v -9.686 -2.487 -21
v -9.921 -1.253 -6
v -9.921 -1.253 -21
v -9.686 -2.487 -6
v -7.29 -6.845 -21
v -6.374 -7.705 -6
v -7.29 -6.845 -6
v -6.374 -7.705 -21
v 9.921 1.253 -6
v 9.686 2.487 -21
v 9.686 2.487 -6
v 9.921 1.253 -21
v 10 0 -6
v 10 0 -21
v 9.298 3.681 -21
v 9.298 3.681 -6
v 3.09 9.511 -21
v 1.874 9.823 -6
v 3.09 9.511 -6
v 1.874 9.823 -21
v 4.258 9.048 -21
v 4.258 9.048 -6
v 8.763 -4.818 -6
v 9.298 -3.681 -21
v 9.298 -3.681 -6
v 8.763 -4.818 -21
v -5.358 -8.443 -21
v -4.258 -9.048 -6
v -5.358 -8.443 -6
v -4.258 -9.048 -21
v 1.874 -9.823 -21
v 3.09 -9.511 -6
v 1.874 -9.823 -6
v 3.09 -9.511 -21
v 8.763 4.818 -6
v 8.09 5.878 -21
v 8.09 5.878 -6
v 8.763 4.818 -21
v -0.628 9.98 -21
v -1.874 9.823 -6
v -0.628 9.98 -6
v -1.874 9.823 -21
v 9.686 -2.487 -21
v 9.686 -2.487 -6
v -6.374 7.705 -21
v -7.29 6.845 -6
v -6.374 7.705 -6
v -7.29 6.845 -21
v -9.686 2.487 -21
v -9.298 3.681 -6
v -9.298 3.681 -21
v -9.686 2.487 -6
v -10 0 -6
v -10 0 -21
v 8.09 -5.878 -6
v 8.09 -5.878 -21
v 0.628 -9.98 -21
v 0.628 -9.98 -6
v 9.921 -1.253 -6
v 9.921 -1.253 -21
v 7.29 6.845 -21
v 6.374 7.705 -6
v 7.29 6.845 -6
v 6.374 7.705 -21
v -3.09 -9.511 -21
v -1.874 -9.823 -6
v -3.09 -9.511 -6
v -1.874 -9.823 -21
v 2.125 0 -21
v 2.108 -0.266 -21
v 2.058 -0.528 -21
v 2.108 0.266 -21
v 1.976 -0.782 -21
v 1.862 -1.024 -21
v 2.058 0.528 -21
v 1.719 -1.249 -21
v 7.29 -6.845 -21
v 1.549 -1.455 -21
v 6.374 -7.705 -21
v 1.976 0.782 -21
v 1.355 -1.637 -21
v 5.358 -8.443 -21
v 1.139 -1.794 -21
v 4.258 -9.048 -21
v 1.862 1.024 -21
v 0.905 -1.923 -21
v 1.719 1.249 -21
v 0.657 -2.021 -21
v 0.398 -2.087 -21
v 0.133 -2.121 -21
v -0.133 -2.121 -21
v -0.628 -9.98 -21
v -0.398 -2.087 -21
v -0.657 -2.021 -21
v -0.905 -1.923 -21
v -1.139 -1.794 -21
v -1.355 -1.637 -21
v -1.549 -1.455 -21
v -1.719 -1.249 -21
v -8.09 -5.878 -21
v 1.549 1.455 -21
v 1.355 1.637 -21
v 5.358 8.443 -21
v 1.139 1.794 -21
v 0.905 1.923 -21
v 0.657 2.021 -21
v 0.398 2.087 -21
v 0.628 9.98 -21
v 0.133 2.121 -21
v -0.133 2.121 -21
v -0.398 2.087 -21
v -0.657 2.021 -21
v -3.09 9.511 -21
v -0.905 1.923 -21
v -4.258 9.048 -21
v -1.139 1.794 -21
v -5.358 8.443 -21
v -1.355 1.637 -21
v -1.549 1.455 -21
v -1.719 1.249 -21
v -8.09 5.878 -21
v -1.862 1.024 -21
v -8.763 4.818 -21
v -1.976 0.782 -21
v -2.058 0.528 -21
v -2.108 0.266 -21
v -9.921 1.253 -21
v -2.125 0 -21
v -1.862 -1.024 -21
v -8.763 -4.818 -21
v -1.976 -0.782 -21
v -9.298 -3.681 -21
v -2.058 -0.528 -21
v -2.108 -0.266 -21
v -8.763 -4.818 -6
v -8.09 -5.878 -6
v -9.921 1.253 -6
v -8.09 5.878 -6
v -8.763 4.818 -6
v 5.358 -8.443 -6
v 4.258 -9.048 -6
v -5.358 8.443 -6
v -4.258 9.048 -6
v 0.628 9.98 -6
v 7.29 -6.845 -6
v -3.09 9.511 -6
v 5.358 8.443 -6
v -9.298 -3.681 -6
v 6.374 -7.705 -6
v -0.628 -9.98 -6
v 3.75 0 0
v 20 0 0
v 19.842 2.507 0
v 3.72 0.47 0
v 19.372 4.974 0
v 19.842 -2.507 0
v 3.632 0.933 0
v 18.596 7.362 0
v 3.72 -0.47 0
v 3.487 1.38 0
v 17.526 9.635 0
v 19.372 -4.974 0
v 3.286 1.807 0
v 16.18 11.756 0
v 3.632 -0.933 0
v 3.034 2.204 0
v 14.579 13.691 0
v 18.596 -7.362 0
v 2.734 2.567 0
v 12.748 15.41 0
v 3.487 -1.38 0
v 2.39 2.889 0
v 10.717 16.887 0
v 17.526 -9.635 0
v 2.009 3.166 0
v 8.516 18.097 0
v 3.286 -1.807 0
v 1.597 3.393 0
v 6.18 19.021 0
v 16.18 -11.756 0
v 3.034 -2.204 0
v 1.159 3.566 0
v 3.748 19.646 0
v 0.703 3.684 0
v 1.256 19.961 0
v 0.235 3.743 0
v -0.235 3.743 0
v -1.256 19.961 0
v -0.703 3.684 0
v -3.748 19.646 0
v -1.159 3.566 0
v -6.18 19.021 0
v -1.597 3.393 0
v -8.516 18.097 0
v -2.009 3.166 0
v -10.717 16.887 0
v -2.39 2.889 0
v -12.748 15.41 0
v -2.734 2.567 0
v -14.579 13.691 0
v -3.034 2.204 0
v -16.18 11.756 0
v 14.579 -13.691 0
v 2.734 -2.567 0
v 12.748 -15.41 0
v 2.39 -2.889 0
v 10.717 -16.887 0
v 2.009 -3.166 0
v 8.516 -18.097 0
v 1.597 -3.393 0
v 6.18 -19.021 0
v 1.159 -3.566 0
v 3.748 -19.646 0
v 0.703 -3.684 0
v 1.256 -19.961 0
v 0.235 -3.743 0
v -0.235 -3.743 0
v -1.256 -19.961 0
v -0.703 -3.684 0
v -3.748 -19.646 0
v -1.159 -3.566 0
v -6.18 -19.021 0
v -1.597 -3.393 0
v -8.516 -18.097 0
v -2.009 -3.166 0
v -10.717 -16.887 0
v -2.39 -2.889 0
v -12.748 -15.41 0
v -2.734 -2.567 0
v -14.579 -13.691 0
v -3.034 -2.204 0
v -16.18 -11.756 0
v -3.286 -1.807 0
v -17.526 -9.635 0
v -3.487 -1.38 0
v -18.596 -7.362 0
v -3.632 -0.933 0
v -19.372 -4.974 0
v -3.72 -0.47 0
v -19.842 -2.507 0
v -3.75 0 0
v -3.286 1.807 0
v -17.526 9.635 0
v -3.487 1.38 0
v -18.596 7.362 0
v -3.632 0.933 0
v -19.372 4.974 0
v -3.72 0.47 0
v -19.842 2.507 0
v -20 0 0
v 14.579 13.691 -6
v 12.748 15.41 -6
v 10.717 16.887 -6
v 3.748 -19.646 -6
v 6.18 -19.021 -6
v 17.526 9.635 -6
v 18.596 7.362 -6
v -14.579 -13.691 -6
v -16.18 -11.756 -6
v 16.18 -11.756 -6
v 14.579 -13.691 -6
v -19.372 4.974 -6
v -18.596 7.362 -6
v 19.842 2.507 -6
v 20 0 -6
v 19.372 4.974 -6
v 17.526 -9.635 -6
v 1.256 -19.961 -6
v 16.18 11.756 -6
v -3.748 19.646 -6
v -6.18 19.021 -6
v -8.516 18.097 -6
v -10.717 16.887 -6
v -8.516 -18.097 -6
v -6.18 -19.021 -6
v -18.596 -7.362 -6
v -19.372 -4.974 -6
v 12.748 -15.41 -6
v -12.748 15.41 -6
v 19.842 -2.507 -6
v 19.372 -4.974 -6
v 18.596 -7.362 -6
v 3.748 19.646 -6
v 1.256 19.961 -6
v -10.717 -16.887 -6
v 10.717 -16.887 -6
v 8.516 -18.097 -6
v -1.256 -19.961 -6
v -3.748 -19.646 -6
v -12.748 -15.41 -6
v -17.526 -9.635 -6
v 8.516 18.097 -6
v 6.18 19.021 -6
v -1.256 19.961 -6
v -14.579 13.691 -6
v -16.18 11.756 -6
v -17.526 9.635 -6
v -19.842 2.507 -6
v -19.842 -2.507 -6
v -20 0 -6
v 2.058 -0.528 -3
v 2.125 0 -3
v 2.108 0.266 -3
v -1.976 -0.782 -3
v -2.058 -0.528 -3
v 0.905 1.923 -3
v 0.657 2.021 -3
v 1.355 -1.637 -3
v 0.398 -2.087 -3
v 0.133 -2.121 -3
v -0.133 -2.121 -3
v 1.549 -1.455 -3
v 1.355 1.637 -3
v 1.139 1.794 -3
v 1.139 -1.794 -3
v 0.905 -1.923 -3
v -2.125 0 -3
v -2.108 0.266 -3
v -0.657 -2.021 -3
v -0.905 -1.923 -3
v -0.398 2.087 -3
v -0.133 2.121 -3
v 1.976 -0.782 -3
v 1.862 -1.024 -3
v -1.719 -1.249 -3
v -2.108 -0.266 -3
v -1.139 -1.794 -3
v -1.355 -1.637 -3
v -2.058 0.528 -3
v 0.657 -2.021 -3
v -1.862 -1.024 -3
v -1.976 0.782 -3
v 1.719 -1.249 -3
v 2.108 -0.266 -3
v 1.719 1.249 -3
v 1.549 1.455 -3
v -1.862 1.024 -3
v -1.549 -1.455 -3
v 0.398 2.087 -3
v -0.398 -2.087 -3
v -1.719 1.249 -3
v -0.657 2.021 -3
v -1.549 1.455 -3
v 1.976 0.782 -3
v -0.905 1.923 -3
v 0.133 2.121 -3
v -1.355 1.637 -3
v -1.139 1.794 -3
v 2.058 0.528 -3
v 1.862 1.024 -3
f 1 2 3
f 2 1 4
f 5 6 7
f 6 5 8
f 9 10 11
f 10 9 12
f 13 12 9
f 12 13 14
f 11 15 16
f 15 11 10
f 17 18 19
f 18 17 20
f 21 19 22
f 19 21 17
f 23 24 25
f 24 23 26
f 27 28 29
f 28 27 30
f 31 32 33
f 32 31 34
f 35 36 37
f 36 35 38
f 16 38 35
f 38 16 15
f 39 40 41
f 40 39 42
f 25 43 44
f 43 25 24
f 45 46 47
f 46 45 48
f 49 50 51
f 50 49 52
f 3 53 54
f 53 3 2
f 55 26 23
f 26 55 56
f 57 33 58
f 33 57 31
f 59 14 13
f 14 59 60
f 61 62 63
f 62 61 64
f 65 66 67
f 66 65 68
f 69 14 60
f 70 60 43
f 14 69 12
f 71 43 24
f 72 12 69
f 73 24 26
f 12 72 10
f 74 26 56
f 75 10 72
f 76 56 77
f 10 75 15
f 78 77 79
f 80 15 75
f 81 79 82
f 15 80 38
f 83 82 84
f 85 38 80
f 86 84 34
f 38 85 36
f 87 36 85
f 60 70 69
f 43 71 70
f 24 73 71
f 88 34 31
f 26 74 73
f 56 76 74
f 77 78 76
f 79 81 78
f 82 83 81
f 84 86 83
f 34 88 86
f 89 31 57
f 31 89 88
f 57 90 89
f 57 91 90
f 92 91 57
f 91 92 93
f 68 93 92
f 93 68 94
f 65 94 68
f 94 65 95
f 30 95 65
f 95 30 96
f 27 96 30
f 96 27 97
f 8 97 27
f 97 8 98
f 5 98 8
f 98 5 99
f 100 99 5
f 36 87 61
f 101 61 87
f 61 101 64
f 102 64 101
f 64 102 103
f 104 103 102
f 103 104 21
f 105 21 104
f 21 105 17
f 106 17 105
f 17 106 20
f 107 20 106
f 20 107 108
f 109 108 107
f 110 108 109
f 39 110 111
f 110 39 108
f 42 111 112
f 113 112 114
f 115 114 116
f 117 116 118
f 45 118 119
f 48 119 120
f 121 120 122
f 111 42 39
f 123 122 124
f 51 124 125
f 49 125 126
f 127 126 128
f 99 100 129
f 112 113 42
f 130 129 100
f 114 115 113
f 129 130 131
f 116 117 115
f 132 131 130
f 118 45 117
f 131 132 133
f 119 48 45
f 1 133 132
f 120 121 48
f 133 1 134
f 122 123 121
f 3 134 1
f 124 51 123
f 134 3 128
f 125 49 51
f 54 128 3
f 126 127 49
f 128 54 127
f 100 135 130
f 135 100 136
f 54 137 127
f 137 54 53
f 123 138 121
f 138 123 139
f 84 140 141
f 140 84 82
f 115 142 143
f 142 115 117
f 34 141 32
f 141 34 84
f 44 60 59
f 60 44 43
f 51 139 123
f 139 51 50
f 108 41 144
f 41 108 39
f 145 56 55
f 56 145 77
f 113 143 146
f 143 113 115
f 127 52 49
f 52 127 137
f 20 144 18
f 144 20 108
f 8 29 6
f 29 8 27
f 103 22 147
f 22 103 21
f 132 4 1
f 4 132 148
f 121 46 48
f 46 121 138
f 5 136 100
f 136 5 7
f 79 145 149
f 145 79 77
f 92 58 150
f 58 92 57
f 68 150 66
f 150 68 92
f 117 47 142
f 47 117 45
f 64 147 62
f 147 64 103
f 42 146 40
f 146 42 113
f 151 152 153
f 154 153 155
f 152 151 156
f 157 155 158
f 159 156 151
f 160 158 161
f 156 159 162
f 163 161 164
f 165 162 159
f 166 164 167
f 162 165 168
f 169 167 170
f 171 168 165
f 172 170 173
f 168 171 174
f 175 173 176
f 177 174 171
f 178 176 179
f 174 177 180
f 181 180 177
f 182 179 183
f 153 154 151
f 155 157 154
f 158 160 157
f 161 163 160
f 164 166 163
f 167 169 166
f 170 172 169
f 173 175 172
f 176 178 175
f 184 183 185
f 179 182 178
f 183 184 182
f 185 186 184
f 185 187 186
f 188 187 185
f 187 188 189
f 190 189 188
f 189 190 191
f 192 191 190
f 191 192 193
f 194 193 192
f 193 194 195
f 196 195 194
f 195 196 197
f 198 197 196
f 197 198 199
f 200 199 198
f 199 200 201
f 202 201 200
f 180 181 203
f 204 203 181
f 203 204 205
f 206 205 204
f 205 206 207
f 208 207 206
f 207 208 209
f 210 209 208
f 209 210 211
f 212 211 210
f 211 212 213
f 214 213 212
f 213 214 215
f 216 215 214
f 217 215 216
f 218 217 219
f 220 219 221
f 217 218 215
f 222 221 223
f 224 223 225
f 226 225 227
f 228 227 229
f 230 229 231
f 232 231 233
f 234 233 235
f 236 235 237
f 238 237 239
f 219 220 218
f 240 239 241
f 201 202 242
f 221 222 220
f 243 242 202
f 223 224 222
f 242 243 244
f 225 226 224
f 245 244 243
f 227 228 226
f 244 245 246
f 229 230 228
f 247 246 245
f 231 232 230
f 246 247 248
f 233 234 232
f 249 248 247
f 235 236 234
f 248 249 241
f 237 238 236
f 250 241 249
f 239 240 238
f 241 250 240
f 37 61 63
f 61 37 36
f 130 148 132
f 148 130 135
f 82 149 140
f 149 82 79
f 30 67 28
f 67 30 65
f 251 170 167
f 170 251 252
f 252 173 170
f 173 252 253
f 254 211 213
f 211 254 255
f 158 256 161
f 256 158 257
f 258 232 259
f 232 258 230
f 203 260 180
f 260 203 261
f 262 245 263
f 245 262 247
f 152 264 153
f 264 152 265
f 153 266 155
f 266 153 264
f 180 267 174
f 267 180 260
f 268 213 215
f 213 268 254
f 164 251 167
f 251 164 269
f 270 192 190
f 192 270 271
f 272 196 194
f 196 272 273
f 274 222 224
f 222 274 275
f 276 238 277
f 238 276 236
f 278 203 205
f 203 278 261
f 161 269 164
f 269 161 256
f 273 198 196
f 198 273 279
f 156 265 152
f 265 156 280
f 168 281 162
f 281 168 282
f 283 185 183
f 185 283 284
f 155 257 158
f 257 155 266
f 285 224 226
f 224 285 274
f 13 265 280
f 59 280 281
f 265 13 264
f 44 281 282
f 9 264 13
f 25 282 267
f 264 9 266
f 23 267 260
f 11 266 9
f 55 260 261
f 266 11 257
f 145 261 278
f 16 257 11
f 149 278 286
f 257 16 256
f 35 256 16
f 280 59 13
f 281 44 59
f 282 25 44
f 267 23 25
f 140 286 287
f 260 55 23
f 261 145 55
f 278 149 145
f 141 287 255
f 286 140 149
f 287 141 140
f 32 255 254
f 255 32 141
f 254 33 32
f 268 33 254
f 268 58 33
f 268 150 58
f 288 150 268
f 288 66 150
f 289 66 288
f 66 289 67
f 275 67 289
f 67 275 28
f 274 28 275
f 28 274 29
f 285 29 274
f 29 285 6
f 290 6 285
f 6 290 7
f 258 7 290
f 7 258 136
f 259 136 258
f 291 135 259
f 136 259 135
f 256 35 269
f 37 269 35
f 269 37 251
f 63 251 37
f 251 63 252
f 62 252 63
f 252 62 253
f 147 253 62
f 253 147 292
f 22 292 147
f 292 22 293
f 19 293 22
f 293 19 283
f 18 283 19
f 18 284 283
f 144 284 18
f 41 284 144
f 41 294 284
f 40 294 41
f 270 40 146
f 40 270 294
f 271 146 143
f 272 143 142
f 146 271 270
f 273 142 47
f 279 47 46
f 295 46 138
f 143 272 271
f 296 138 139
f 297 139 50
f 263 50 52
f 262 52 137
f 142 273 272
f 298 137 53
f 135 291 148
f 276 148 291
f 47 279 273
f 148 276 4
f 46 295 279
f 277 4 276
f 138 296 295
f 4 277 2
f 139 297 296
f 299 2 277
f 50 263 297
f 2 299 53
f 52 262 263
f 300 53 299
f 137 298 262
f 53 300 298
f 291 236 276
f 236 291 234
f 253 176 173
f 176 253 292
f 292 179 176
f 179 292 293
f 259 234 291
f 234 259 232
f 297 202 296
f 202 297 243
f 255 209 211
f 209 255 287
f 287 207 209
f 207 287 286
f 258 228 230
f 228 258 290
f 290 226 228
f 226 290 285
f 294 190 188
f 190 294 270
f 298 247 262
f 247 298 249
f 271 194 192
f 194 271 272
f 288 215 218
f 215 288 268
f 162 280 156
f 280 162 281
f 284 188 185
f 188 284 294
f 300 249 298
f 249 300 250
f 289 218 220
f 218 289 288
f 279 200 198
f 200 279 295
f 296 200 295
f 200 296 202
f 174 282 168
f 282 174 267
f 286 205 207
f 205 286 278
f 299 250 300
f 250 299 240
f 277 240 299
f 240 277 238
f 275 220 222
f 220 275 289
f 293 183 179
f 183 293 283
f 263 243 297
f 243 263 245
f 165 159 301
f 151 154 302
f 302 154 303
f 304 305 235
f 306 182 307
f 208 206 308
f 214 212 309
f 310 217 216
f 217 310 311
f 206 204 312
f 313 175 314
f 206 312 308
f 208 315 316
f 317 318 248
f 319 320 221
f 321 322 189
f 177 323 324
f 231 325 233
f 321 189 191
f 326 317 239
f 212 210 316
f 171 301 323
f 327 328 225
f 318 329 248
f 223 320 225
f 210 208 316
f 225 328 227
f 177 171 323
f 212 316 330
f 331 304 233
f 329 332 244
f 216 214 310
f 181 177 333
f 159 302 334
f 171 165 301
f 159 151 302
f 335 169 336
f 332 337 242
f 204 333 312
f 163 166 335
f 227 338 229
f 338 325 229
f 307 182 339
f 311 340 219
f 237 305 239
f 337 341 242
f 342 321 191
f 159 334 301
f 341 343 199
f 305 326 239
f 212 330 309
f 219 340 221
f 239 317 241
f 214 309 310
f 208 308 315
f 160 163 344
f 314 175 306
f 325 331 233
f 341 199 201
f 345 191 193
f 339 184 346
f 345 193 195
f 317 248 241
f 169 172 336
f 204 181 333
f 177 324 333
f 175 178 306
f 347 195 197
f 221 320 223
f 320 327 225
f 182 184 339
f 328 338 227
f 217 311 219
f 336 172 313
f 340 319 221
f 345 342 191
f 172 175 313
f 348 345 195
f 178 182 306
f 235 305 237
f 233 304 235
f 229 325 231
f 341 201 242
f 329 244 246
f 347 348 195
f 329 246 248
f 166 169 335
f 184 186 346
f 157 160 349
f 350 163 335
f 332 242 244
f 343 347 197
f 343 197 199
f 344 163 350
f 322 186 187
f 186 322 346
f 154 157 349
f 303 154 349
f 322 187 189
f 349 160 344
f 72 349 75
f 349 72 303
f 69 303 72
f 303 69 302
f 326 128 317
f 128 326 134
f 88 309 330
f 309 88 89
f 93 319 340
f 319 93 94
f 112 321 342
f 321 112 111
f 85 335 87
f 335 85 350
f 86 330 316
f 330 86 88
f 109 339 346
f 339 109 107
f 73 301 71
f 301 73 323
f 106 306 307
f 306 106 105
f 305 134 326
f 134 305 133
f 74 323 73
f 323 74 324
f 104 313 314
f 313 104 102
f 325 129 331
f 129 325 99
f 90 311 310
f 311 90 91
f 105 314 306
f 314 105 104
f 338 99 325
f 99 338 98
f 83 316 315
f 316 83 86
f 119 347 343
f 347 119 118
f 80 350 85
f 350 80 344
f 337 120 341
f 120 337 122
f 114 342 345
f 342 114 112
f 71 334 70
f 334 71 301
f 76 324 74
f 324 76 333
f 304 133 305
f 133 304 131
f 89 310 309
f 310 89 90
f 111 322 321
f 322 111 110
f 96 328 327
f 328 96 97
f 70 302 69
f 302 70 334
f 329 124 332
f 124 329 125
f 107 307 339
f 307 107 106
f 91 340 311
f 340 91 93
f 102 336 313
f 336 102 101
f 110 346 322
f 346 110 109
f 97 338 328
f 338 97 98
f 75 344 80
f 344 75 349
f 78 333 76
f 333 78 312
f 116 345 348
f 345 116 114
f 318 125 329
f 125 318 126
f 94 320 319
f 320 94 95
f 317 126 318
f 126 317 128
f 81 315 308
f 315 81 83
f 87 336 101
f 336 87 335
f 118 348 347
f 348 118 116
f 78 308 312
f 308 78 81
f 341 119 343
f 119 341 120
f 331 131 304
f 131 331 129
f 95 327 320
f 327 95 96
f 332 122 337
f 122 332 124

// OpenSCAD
$fn = 50;


difference() {
	union() {
		translate(v = [0, 0, -21.0000000000]) {
			cylinder(h = 21, r = 10.0000000000);
		}
		translate(v = [0, 0, -6.0000000000]) {
			cylinder(h = 6, r = 20.0000000000);
		}
	}
	union() {
		translate(v = [0, 0, 0]) {
			rotate(a = [0, 0, 0]) {
				difference() {
					union() {
						#translate(v = [0, 0, -21.0000000000]) {
							cylinder(h = 21, r = 2.0000000000);
						}
						#translate(v = [0, 0, -3]) {
							cylinder(h = 3, r1 = 2.1250000000, r2 = 3.7500000000);
						}
						#translate(v = [0, 0, -21.0000000000]) {
							cylinder(h = 21, r = 2.1250000000);
						}
						#translate(v = [0, 0, -21.0000000000]) {
							cylinder(h = 21, r = 2.0000000000);
						}
					}
					union();
				}
			}
		}
	}
}
